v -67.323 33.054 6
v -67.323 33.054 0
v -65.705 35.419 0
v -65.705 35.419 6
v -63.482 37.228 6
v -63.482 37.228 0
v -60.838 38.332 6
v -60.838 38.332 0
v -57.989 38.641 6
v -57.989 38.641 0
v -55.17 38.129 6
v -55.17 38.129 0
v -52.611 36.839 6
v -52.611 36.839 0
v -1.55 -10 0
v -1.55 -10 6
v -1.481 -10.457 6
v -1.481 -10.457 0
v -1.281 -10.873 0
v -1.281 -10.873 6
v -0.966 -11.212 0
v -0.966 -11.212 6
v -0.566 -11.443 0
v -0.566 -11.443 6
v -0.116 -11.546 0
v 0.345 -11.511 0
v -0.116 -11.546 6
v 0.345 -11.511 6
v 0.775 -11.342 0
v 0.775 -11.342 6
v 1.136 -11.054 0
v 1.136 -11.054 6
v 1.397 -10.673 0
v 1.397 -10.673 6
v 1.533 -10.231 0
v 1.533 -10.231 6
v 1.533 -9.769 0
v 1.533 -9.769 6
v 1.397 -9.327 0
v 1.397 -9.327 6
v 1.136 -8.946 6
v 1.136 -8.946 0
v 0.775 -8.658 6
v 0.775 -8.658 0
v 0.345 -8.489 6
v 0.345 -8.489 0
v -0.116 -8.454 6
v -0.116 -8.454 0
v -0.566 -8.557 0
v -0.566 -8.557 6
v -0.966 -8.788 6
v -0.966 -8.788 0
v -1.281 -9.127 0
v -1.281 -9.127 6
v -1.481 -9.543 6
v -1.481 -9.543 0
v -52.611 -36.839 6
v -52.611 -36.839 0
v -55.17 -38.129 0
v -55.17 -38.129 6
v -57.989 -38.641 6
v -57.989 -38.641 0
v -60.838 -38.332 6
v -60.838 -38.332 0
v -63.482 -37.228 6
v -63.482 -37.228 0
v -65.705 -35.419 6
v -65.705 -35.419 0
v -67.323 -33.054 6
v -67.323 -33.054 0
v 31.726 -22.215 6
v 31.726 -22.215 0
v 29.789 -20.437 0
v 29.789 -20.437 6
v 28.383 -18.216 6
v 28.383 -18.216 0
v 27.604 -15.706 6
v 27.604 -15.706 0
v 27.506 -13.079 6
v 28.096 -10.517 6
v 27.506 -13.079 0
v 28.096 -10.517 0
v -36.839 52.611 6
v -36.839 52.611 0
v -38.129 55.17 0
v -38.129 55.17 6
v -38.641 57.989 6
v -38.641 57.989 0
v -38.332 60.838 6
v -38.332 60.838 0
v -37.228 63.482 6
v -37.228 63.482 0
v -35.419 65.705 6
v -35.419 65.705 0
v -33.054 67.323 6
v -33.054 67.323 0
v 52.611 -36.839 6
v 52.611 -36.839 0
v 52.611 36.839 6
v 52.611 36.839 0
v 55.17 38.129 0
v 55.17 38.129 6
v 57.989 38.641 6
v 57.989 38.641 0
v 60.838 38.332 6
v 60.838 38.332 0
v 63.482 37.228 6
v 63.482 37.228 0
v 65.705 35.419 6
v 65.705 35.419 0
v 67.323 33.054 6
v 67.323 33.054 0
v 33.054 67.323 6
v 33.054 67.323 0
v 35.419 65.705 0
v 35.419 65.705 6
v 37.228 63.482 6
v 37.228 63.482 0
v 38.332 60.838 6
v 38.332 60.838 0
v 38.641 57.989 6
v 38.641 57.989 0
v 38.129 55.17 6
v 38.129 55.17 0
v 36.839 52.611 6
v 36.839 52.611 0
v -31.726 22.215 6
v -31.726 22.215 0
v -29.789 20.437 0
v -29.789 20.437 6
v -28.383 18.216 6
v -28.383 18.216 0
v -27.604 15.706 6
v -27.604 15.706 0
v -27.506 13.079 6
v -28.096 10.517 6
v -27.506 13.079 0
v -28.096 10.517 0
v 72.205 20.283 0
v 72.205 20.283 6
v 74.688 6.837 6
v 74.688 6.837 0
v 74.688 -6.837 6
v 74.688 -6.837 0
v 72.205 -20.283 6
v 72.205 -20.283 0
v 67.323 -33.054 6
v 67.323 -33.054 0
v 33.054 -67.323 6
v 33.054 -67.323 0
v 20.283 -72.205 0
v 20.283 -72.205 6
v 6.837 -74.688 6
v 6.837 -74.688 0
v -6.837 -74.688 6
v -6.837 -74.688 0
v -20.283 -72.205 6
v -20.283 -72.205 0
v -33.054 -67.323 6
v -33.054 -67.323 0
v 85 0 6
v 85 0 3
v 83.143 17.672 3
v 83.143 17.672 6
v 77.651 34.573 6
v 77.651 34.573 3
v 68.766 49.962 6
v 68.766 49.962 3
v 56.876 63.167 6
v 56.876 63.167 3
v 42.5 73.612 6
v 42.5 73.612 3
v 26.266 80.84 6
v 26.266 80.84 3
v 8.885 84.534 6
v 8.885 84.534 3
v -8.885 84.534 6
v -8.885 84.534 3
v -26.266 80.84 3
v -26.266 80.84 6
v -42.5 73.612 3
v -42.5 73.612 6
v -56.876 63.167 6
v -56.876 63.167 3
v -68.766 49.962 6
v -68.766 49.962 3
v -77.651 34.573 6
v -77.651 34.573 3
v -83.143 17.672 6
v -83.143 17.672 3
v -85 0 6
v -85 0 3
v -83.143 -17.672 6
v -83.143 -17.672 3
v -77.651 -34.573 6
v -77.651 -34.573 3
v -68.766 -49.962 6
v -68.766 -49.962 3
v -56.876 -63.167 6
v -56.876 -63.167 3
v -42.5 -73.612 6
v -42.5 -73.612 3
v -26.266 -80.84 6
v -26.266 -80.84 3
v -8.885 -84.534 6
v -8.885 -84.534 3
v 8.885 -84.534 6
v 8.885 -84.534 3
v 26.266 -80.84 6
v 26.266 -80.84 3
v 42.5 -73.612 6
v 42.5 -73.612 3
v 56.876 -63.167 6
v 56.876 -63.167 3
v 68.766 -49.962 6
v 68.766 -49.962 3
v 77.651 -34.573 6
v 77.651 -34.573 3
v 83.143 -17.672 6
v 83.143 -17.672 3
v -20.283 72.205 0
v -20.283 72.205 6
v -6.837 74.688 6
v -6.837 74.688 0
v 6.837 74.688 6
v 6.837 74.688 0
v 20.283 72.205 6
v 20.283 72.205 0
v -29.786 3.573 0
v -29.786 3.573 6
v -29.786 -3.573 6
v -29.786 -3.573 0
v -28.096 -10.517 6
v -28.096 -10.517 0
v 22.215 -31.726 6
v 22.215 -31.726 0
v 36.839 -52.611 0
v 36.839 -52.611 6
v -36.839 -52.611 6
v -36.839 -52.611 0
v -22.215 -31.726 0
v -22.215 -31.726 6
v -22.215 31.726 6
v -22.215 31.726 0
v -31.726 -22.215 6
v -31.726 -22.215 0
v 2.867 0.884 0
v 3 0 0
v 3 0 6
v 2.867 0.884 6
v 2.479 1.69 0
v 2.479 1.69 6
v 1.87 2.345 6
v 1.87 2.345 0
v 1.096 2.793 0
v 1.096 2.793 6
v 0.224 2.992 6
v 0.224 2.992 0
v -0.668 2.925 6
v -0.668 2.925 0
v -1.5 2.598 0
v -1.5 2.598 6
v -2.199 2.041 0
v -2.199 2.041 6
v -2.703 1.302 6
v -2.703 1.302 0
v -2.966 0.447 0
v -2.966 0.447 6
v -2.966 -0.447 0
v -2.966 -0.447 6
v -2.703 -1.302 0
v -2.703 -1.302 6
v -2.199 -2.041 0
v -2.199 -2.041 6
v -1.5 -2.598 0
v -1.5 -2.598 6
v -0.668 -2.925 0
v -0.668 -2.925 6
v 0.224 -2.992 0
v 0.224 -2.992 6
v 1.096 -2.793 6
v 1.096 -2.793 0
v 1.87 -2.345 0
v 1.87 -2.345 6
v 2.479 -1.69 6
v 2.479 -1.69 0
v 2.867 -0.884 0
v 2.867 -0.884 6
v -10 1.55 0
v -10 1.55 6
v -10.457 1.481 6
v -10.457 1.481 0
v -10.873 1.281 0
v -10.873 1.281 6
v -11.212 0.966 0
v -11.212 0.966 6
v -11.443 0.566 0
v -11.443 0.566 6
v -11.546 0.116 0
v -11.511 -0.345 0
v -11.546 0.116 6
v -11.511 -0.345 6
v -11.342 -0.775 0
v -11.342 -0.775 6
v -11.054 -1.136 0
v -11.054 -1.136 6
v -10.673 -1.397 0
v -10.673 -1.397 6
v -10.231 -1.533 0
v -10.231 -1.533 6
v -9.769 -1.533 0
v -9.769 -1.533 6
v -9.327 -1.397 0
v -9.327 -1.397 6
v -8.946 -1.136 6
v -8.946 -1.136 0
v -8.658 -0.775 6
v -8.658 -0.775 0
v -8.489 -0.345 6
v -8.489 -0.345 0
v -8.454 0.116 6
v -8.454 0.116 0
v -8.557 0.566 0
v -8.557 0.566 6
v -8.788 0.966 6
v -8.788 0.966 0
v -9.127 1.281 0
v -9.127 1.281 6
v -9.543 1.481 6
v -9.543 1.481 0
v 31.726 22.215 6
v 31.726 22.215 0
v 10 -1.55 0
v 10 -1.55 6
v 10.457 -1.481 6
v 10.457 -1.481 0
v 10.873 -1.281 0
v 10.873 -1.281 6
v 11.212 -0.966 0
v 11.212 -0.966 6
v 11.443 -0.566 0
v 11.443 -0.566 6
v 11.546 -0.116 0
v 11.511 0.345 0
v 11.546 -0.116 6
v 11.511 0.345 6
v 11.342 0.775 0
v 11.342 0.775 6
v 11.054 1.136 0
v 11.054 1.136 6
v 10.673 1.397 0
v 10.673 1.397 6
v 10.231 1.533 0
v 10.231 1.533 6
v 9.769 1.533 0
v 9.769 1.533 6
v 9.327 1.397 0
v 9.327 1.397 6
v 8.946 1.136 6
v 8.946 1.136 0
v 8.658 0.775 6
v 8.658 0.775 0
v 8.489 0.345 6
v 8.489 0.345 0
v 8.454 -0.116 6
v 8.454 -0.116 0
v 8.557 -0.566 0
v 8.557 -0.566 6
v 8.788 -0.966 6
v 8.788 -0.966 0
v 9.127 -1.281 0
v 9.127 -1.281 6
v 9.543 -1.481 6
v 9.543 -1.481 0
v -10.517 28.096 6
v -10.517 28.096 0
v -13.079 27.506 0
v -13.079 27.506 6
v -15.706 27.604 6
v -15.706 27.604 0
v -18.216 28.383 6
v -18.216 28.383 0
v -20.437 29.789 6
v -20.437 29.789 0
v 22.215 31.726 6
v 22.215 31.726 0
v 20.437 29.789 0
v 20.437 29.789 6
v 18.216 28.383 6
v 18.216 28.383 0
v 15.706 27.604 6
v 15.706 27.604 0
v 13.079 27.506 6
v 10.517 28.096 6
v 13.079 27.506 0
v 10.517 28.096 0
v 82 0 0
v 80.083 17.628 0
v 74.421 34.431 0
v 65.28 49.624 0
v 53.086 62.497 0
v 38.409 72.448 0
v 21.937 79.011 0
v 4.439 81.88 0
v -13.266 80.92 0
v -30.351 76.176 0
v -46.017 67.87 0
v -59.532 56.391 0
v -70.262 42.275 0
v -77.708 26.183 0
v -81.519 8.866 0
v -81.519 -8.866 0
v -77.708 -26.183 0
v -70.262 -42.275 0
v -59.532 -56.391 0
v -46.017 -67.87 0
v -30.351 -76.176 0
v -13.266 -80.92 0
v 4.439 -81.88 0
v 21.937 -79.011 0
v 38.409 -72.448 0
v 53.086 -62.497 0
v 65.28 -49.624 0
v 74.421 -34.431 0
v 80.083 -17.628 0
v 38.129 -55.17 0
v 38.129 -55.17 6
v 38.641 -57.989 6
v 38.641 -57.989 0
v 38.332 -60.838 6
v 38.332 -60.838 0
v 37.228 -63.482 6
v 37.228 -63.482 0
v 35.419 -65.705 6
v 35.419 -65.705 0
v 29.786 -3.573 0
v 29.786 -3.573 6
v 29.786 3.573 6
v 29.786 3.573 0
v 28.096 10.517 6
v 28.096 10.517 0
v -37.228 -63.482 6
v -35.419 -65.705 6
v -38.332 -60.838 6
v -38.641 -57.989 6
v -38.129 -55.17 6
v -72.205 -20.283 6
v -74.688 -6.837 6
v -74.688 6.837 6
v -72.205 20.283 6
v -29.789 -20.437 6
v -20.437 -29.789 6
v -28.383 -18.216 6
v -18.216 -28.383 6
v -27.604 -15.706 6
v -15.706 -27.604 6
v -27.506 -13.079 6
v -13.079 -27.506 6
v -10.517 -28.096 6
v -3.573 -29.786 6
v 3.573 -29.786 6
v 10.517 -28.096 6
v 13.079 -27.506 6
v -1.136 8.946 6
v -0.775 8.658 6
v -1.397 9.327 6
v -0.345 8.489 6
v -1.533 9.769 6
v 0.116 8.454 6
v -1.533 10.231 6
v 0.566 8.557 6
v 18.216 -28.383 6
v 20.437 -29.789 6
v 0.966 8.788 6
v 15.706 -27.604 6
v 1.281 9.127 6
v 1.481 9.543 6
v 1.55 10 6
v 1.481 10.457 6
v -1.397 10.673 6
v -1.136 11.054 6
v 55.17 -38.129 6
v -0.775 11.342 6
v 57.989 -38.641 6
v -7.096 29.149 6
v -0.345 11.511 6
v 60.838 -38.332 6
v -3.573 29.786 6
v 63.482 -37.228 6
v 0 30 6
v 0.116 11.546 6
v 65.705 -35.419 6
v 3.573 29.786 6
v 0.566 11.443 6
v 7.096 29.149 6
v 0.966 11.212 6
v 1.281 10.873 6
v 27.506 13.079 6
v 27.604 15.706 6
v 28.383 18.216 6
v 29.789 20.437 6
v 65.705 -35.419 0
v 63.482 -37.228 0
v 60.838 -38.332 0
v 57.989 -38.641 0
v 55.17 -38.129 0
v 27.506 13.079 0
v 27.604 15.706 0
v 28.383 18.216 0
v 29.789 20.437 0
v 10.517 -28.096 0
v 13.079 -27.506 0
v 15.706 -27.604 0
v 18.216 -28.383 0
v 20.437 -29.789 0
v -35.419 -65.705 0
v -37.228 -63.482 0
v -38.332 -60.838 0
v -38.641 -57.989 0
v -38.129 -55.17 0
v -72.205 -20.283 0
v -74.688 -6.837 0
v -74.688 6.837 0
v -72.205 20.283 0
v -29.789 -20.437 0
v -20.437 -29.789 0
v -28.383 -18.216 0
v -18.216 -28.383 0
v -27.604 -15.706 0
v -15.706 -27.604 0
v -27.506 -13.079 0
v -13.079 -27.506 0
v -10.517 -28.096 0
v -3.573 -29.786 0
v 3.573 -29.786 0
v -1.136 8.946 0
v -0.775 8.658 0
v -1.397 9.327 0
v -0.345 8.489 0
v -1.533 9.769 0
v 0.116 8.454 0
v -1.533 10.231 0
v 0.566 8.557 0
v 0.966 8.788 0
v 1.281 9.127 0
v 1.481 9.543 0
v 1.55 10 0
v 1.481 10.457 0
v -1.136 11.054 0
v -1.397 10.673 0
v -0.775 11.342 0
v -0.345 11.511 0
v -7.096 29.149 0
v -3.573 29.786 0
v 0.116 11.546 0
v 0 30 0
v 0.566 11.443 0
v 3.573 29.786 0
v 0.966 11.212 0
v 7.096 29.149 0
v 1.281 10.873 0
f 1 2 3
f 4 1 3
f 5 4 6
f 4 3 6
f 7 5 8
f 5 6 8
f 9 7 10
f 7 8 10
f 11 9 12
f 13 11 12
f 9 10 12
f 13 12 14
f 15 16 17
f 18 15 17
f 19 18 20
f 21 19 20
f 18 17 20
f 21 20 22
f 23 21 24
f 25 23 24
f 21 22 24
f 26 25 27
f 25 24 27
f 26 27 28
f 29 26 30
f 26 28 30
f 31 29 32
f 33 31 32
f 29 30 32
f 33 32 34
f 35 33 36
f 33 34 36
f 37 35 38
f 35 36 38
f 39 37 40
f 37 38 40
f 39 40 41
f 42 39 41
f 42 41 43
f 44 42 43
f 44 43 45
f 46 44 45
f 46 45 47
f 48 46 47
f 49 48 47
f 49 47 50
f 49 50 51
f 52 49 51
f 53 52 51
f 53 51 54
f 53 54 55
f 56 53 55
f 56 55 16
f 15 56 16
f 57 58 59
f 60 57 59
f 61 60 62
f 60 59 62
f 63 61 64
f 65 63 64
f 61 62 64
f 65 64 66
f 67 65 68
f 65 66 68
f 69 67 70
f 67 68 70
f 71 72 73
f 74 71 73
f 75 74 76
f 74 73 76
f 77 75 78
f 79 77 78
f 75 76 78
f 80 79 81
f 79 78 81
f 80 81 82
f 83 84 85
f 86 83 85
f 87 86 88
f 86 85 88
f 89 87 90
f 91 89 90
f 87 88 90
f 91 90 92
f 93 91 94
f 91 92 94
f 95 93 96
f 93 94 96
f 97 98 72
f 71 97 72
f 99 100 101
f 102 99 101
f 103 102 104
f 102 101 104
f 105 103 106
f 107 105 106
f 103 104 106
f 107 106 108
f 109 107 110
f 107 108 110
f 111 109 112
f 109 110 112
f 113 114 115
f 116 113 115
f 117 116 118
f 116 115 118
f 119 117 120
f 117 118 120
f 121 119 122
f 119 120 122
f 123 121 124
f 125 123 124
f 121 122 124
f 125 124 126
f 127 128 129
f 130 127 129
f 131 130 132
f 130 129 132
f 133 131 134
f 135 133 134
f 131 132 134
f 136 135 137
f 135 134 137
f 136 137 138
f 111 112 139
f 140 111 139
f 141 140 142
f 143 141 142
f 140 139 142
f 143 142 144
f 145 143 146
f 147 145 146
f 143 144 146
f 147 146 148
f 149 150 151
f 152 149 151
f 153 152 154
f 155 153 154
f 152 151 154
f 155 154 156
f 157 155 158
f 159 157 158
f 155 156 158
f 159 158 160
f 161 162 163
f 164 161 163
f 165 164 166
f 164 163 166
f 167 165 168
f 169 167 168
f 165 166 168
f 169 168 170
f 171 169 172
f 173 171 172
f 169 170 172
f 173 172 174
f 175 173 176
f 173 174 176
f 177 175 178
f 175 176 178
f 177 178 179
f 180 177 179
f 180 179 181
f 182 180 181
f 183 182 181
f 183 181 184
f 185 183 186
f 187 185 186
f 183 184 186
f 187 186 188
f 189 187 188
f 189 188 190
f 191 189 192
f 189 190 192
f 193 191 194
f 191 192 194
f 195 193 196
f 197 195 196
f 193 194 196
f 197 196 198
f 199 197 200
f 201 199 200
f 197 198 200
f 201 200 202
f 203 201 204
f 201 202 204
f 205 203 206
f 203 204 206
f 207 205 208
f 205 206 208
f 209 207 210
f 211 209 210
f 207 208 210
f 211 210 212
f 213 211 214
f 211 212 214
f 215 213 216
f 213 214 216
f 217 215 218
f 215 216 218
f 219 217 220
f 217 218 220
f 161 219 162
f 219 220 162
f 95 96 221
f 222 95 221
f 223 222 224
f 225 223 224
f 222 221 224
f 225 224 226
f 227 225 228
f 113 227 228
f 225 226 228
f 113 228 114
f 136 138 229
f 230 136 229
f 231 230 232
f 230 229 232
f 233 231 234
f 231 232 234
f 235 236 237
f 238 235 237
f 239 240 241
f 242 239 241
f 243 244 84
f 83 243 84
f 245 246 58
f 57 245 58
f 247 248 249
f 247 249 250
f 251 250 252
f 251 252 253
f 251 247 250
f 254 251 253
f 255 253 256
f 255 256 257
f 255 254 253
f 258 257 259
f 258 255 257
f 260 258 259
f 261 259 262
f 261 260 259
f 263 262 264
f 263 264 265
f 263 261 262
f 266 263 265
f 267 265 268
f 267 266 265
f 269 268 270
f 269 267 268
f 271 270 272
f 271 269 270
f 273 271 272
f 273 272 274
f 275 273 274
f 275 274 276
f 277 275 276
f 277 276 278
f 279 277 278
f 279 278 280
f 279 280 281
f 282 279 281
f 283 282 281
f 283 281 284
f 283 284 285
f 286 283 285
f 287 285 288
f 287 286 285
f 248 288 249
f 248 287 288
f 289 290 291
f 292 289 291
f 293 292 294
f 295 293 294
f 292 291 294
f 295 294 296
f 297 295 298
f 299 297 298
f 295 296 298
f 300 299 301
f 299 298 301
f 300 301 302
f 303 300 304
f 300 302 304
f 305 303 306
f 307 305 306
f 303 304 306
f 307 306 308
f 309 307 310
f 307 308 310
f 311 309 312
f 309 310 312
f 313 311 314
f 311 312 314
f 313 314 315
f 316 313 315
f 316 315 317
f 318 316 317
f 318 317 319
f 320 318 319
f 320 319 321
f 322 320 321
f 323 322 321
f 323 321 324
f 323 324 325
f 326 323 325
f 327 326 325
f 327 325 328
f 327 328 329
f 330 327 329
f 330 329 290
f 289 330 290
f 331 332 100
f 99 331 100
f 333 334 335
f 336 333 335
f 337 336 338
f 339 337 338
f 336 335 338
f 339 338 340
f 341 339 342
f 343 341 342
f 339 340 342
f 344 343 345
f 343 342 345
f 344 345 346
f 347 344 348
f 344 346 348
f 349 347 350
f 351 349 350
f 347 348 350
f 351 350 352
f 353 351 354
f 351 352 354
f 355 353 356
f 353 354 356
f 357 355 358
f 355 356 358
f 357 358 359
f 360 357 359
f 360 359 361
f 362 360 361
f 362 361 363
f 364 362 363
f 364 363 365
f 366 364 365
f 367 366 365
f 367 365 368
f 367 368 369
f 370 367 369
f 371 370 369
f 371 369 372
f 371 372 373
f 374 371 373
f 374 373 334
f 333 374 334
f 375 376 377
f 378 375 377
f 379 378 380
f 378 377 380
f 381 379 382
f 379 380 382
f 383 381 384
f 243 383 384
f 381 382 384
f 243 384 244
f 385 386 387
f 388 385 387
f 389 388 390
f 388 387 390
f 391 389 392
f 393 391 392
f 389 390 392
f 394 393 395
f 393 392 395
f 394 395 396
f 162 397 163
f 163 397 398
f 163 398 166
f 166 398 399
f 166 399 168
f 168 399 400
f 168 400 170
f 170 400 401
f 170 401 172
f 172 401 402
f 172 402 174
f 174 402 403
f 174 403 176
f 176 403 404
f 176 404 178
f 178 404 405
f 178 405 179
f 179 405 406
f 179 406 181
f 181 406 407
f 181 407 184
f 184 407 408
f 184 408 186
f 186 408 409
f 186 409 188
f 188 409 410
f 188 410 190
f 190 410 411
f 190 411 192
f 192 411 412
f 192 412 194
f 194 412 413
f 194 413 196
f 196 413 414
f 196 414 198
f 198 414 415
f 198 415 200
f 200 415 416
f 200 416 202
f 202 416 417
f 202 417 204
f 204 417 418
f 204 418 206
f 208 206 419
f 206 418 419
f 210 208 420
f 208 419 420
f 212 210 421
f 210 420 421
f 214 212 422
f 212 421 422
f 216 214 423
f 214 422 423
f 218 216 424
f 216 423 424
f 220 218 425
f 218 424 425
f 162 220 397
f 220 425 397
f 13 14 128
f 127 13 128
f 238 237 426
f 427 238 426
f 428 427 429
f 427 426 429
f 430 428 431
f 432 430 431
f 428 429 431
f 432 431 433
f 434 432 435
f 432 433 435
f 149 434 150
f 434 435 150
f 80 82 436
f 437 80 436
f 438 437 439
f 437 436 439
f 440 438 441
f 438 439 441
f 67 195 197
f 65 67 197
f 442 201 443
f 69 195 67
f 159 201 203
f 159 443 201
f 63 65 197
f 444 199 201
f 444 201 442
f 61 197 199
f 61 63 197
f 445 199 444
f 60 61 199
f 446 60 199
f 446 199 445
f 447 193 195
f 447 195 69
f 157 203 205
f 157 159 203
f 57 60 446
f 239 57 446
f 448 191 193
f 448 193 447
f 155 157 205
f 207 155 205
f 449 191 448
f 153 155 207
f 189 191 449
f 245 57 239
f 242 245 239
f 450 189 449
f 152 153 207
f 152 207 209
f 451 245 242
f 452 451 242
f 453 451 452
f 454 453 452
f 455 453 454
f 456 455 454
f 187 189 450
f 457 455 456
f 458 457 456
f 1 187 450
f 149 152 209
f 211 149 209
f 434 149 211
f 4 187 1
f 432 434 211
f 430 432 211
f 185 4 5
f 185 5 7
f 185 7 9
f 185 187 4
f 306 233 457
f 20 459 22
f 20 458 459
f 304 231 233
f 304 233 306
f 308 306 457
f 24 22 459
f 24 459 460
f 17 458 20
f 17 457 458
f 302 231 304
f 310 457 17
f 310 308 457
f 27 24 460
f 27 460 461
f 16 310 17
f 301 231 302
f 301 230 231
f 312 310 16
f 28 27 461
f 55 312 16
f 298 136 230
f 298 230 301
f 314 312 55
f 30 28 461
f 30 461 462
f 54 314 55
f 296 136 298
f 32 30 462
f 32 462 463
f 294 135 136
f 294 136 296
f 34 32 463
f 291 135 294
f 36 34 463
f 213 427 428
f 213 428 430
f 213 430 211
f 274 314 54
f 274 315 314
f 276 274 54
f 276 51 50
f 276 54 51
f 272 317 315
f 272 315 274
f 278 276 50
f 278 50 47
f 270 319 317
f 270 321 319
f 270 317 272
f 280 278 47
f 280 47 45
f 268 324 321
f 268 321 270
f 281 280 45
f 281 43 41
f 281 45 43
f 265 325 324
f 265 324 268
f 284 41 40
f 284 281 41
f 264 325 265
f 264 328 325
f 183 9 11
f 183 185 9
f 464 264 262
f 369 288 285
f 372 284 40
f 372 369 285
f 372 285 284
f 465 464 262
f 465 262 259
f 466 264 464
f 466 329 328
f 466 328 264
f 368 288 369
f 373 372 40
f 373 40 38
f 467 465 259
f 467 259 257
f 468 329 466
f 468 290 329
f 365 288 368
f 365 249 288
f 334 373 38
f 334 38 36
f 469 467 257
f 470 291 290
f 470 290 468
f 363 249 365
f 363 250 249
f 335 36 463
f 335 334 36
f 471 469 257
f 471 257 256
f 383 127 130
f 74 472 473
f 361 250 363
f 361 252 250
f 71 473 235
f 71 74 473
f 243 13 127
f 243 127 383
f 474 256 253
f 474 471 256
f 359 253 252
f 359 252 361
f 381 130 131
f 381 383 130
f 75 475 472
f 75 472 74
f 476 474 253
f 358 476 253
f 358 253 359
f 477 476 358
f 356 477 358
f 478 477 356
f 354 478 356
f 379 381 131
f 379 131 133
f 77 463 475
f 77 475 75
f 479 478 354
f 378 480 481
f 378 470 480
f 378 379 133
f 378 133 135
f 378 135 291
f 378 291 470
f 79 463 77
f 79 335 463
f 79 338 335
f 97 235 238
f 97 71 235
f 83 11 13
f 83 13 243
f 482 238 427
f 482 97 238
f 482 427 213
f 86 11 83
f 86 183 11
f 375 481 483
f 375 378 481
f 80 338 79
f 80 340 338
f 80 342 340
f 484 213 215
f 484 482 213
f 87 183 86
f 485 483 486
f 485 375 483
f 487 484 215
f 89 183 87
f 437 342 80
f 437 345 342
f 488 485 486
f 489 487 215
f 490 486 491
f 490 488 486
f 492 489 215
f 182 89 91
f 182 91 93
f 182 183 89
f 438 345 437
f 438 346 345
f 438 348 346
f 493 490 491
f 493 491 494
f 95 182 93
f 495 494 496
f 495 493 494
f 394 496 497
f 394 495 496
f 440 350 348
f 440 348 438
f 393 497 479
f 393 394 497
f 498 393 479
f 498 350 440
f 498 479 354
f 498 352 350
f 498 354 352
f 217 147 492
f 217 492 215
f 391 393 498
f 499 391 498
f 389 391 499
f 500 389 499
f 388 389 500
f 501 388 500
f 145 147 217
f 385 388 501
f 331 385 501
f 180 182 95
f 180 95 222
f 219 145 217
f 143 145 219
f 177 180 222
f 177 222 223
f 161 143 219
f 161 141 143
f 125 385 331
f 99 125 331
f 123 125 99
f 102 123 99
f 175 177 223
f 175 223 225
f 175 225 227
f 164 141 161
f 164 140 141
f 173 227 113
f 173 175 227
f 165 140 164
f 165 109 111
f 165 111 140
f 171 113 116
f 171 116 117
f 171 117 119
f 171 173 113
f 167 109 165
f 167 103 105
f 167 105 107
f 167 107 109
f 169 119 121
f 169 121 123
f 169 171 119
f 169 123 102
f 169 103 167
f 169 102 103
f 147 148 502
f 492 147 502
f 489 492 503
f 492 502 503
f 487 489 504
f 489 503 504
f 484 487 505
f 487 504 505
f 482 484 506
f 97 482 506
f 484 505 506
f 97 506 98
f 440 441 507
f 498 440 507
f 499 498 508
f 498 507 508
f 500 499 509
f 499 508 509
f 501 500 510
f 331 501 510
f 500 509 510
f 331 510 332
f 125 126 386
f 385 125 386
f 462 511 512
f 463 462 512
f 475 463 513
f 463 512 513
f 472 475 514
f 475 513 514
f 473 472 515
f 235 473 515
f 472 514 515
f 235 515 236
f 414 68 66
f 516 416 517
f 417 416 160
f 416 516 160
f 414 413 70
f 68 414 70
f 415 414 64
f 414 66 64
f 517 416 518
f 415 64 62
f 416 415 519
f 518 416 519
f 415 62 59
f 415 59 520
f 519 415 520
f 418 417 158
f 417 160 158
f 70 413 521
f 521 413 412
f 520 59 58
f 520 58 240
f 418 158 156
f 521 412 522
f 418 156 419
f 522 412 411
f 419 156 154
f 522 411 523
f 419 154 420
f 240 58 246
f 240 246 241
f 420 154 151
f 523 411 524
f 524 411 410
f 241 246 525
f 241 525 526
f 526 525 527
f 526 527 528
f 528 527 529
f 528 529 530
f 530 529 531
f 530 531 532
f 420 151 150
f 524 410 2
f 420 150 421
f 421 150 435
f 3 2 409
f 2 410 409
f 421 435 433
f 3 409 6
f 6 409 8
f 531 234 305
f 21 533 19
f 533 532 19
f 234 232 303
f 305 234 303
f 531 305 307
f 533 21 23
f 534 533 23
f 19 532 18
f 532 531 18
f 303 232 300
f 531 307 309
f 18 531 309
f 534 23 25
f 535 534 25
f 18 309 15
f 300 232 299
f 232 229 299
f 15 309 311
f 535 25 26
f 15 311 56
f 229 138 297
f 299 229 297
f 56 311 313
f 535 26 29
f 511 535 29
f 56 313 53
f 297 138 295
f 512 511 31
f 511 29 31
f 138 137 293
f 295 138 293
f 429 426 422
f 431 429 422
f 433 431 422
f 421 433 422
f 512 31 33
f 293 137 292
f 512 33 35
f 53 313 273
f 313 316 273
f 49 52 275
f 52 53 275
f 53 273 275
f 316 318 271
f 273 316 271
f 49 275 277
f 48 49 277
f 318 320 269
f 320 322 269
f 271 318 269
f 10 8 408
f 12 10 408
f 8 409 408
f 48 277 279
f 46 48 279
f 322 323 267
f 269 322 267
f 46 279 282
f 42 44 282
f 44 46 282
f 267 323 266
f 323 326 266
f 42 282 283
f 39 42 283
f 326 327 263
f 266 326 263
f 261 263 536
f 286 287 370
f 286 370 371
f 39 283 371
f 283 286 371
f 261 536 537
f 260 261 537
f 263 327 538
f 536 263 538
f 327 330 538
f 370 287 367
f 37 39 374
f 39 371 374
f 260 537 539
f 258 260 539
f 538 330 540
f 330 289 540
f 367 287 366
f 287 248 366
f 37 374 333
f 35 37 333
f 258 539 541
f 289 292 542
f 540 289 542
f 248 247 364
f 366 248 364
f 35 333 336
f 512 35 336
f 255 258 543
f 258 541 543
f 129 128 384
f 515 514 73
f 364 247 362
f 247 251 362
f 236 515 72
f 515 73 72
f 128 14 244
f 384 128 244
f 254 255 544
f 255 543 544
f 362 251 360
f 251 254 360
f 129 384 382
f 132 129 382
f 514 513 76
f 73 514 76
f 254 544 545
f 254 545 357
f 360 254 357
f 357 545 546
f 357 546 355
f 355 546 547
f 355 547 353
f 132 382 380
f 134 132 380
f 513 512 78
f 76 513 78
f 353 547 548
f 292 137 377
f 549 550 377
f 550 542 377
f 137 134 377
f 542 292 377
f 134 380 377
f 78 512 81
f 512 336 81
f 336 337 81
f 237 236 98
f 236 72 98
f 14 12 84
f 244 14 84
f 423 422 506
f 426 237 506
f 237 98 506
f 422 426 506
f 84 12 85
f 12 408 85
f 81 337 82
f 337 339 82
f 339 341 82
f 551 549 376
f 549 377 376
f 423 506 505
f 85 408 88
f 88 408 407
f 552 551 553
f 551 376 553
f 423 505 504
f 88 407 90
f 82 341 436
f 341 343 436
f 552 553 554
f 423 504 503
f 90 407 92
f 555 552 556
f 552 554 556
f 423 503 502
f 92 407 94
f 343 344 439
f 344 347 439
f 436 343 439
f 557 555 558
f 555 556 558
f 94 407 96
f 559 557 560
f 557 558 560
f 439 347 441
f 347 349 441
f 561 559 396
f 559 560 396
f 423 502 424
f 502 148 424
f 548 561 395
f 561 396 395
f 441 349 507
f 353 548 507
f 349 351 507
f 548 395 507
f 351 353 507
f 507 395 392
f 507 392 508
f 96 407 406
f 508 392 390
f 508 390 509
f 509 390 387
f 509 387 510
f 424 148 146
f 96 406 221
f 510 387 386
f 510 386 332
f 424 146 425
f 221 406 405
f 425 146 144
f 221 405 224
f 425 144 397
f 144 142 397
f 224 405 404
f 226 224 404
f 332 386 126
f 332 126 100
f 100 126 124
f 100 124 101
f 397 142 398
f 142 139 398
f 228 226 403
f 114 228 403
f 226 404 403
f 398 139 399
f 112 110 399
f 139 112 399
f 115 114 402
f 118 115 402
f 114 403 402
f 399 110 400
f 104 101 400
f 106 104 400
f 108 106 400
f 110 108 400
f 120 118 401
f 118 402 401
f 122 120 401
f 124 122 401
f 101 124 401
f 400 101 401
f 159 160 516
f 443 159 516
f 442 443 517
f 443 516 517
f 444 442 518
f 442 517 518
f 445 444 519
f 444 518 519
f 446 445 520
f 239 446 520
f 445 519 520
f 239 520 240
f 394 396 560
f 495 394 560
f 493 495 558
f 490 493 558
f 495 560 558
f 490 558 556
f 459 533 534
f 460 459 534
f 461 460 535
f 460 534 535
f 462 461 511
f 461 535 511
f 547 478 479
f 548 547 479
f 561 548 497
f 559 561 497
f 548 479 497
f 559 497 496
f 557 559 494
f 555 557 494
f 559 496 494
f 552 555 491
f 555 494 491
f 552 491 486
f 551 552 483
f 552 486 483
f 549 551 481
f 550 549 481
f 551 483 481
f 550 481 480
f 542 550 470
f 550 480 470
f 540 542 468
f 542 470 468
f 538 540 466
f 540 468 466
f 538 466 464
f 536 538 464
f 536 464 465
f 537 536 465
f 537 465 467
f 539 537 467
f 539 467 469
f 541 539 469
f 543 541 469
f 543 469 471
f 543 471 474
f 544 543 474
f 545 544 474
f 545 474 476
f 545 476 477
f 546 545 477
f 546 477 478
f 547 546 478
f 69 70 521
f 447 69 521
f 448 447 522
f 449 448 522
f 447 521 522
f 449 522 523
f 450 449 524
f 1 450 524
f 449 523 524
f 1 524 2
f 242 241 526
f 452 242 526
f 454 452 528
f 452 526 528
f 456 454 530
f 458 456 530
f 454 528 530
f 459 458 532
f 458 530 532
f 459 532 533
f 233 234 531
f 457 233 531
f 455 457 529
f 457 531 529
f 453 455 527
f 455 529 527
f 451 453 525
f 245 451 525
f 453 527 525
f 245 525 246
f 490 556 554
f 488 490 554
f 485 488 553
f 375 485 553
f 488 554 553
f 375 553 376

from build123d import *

# Parameters (mm, degrees)
SKETCH_1_R               = 85
SKETCH_1_R_2             = 3
EXTRUDE_1_DEPTH          = 6
SKETCH_2_R               = 1.55
CUT_EXTRUDE_1_DEPTH      = 121.357799913
PATTERN_CIRCULAR_2_COUNT = 4
CHAMFER_1_SIZE           = 3


with BuildPart() as part:
    # 草图1 → 凸台-拉伸1 (new body)
    with BuildSketch(Plane.XY):
        Circle(SKETCH_1_R)
        Circle(SKETCH_1_R_2, mode=Mode.SUBTRACT)
        with BuildLine():
            Line((-31.725622255, -22.214519858), (-52.610992631, -36.838613633))
            ThreePointArc((-52.610992631, -36.838613633), (-60.837871991, -38.331841306), (-67.323181147, -33.054338296))
            ThreePointArc((-67.323181147, -33.054338296), (-75, 0), (-67.323181147, 33.054338296))
            ThreePointArc((-67.323181147, 33.054338296), (-60.837871698, 38.331841382), (-52.610992136, 36.838613286))
            Line((-52.610992136, 36.838613286), (-31.725621944, 22.214519639))
            ThreePointArc((-31.725621944, 22.214519639), (-27.910605359, 16.986540764), (-28.096039964, 10.517249561))
            ThreePointArc((-28.096039964, 10.517249561), (-30, 0), (-28.096039964, -10.517249561))
            ThreePointArc((-28.096039964, -10.517249561), (-27.910605416, -16.986540946), (-31.725622255, -22.214519858))
        make_face(mode=Mode.SUBTRACT)
        with BuildLine():
            Line((22.214519858, -31.725622255), (36.838613633, -52.610992631))
            ThreePointArc((36.838613633, -52.610992631), (38.331841306, -60.837871991), (33.054338296, -67.323181147))
            ThreePointArc((33.054338296, -67.323181147), (0, -75), (-33.054338296, -67.323181147))
            ThreePointArc((-33.054338296, -67.323181147), (-38.331841382, -60.837871698), (-36.838613286, -52.610992136))
            Line((-36.838613286, -52.610992136), (-22.214519639, -31.725621944))
            ThreePointArc((-22.214519639, -31.725621944), (-16.986540764, -27.910605359), (-10.517249561, -28.096039964))
            ThreePointArc((-10.517249561, -28.096039964), (0, -30), (10.517249561, -28.096039964))
            ThreePointArc((10.517249561, -28.096039964), (16.986540946, -27.910605416), (22.214519858, -31.725622255))
        make_face(mode=Mode.SUBTRACT)
        with BuildLine():
            ThreePointArc((-10.517249561, 28.096039964), (-16.986540946, 27.910605416), (-22.214519858, 31.725622255))
            Line((-22.214519858, 31.725622255), (-36.838613633, 52.610992631))
            ThreePointArc((-36.838613633, 52.610992631), (-38.331841306, 60.837871991), (-33.054338296, 67.323181147))
            ThreePointArc((-33.054338296, 67.323181147), (0, 75), (33.054338296, 67.323181147))
            ThreePointArc((33.054338296, 67.323181147), (38.331841382, 60.837871698), (36.838613286, 52.610992136))
            Line((36.838613286, 52.610992136), (22.214519639, 31.725621944))
            ThreePointArc((22.214519639, 31.725621944), (16.986540764, 27.910605359), (10.517249561, 28.096039964))
            ThreePointArc((10.517249561, 28.096039964), (5.3440996, 29.520172755), (0, 30))
            ThreePointArc((0, 30), (-5.3440996, 29.520172755), (-10.517249561, 28.096039964))
        make_face(mode=Mode.SUBTRACT)
        with BuildLine():
            Line((31.725622255, 22.214519858), (52.610992631, 36.838613633))
            ThreePointArc((52.610992631, 36.838613633), (60.837871991, 38.331841306), (67.323181147, 33.054338296))
            ThreePointArc((67.323181147, 33.054338296), (75, 0), (67.323181147, -33.054338296))
            ThreePointArc((67.323181147, -33.054338296), (60.837871698, -38.331841382), (52.610992136, -36.838613286))
            Line((52.610992136, -36.838613286), (31.725621944, -22.214519639))
            ThreePointArc((31.725621944, -22.214519639), (27.910605359, -16.986540764), (28.096039964, -10.517249561))
            ThreePointArc((28.096039964, -10.517249561), (30, 0), (28.096039964, 10.517249561))
            ThreePointArc((28.096039964, 10.517249561), (27.910605416, 16.986540946), (31.725622255, 22.214519858))
        make_face(mode=Mode.SUBTRACT)
    extrude(amount=EXTRUDE_1_DEPTH)

    # 草图2 → 切除-拉伸1 (cut, through all)
    with BuildSketch(Plane.XY.offset(6)):
        with Locations((0, 10)):
            Circle(SKETCH_2_R)
    cut_extrude_1 = extrude(amount=-CUT_EXTRUDE_1_DEPTH, mode=Mode.SUBTRACT)

    # 阵列(圆周)2: 切除-拉伸1 ×4 about axis
    pattern_circular_2_axis = Axis((0, 0, 0), (0, 0, 1))
    for i in range(1, PATTERN_CIRCULAR_2_COUNT):
        add(cut_extrude_1.rotate(pattern_circular_2_axis, i * 360 / PATTERN_CIRCULAR_2_COUNT), mode=Mode.SUBTRACT)

    # 倒角1
    chamfer_1_edges = [part.edges().sort_by_distance(p)[0] for p in [
        (-85, 0, 0),
    ]]
    chamfer(chamfer_1_edges, length=CHAMFER_1_SIZE)


solid = part.part
